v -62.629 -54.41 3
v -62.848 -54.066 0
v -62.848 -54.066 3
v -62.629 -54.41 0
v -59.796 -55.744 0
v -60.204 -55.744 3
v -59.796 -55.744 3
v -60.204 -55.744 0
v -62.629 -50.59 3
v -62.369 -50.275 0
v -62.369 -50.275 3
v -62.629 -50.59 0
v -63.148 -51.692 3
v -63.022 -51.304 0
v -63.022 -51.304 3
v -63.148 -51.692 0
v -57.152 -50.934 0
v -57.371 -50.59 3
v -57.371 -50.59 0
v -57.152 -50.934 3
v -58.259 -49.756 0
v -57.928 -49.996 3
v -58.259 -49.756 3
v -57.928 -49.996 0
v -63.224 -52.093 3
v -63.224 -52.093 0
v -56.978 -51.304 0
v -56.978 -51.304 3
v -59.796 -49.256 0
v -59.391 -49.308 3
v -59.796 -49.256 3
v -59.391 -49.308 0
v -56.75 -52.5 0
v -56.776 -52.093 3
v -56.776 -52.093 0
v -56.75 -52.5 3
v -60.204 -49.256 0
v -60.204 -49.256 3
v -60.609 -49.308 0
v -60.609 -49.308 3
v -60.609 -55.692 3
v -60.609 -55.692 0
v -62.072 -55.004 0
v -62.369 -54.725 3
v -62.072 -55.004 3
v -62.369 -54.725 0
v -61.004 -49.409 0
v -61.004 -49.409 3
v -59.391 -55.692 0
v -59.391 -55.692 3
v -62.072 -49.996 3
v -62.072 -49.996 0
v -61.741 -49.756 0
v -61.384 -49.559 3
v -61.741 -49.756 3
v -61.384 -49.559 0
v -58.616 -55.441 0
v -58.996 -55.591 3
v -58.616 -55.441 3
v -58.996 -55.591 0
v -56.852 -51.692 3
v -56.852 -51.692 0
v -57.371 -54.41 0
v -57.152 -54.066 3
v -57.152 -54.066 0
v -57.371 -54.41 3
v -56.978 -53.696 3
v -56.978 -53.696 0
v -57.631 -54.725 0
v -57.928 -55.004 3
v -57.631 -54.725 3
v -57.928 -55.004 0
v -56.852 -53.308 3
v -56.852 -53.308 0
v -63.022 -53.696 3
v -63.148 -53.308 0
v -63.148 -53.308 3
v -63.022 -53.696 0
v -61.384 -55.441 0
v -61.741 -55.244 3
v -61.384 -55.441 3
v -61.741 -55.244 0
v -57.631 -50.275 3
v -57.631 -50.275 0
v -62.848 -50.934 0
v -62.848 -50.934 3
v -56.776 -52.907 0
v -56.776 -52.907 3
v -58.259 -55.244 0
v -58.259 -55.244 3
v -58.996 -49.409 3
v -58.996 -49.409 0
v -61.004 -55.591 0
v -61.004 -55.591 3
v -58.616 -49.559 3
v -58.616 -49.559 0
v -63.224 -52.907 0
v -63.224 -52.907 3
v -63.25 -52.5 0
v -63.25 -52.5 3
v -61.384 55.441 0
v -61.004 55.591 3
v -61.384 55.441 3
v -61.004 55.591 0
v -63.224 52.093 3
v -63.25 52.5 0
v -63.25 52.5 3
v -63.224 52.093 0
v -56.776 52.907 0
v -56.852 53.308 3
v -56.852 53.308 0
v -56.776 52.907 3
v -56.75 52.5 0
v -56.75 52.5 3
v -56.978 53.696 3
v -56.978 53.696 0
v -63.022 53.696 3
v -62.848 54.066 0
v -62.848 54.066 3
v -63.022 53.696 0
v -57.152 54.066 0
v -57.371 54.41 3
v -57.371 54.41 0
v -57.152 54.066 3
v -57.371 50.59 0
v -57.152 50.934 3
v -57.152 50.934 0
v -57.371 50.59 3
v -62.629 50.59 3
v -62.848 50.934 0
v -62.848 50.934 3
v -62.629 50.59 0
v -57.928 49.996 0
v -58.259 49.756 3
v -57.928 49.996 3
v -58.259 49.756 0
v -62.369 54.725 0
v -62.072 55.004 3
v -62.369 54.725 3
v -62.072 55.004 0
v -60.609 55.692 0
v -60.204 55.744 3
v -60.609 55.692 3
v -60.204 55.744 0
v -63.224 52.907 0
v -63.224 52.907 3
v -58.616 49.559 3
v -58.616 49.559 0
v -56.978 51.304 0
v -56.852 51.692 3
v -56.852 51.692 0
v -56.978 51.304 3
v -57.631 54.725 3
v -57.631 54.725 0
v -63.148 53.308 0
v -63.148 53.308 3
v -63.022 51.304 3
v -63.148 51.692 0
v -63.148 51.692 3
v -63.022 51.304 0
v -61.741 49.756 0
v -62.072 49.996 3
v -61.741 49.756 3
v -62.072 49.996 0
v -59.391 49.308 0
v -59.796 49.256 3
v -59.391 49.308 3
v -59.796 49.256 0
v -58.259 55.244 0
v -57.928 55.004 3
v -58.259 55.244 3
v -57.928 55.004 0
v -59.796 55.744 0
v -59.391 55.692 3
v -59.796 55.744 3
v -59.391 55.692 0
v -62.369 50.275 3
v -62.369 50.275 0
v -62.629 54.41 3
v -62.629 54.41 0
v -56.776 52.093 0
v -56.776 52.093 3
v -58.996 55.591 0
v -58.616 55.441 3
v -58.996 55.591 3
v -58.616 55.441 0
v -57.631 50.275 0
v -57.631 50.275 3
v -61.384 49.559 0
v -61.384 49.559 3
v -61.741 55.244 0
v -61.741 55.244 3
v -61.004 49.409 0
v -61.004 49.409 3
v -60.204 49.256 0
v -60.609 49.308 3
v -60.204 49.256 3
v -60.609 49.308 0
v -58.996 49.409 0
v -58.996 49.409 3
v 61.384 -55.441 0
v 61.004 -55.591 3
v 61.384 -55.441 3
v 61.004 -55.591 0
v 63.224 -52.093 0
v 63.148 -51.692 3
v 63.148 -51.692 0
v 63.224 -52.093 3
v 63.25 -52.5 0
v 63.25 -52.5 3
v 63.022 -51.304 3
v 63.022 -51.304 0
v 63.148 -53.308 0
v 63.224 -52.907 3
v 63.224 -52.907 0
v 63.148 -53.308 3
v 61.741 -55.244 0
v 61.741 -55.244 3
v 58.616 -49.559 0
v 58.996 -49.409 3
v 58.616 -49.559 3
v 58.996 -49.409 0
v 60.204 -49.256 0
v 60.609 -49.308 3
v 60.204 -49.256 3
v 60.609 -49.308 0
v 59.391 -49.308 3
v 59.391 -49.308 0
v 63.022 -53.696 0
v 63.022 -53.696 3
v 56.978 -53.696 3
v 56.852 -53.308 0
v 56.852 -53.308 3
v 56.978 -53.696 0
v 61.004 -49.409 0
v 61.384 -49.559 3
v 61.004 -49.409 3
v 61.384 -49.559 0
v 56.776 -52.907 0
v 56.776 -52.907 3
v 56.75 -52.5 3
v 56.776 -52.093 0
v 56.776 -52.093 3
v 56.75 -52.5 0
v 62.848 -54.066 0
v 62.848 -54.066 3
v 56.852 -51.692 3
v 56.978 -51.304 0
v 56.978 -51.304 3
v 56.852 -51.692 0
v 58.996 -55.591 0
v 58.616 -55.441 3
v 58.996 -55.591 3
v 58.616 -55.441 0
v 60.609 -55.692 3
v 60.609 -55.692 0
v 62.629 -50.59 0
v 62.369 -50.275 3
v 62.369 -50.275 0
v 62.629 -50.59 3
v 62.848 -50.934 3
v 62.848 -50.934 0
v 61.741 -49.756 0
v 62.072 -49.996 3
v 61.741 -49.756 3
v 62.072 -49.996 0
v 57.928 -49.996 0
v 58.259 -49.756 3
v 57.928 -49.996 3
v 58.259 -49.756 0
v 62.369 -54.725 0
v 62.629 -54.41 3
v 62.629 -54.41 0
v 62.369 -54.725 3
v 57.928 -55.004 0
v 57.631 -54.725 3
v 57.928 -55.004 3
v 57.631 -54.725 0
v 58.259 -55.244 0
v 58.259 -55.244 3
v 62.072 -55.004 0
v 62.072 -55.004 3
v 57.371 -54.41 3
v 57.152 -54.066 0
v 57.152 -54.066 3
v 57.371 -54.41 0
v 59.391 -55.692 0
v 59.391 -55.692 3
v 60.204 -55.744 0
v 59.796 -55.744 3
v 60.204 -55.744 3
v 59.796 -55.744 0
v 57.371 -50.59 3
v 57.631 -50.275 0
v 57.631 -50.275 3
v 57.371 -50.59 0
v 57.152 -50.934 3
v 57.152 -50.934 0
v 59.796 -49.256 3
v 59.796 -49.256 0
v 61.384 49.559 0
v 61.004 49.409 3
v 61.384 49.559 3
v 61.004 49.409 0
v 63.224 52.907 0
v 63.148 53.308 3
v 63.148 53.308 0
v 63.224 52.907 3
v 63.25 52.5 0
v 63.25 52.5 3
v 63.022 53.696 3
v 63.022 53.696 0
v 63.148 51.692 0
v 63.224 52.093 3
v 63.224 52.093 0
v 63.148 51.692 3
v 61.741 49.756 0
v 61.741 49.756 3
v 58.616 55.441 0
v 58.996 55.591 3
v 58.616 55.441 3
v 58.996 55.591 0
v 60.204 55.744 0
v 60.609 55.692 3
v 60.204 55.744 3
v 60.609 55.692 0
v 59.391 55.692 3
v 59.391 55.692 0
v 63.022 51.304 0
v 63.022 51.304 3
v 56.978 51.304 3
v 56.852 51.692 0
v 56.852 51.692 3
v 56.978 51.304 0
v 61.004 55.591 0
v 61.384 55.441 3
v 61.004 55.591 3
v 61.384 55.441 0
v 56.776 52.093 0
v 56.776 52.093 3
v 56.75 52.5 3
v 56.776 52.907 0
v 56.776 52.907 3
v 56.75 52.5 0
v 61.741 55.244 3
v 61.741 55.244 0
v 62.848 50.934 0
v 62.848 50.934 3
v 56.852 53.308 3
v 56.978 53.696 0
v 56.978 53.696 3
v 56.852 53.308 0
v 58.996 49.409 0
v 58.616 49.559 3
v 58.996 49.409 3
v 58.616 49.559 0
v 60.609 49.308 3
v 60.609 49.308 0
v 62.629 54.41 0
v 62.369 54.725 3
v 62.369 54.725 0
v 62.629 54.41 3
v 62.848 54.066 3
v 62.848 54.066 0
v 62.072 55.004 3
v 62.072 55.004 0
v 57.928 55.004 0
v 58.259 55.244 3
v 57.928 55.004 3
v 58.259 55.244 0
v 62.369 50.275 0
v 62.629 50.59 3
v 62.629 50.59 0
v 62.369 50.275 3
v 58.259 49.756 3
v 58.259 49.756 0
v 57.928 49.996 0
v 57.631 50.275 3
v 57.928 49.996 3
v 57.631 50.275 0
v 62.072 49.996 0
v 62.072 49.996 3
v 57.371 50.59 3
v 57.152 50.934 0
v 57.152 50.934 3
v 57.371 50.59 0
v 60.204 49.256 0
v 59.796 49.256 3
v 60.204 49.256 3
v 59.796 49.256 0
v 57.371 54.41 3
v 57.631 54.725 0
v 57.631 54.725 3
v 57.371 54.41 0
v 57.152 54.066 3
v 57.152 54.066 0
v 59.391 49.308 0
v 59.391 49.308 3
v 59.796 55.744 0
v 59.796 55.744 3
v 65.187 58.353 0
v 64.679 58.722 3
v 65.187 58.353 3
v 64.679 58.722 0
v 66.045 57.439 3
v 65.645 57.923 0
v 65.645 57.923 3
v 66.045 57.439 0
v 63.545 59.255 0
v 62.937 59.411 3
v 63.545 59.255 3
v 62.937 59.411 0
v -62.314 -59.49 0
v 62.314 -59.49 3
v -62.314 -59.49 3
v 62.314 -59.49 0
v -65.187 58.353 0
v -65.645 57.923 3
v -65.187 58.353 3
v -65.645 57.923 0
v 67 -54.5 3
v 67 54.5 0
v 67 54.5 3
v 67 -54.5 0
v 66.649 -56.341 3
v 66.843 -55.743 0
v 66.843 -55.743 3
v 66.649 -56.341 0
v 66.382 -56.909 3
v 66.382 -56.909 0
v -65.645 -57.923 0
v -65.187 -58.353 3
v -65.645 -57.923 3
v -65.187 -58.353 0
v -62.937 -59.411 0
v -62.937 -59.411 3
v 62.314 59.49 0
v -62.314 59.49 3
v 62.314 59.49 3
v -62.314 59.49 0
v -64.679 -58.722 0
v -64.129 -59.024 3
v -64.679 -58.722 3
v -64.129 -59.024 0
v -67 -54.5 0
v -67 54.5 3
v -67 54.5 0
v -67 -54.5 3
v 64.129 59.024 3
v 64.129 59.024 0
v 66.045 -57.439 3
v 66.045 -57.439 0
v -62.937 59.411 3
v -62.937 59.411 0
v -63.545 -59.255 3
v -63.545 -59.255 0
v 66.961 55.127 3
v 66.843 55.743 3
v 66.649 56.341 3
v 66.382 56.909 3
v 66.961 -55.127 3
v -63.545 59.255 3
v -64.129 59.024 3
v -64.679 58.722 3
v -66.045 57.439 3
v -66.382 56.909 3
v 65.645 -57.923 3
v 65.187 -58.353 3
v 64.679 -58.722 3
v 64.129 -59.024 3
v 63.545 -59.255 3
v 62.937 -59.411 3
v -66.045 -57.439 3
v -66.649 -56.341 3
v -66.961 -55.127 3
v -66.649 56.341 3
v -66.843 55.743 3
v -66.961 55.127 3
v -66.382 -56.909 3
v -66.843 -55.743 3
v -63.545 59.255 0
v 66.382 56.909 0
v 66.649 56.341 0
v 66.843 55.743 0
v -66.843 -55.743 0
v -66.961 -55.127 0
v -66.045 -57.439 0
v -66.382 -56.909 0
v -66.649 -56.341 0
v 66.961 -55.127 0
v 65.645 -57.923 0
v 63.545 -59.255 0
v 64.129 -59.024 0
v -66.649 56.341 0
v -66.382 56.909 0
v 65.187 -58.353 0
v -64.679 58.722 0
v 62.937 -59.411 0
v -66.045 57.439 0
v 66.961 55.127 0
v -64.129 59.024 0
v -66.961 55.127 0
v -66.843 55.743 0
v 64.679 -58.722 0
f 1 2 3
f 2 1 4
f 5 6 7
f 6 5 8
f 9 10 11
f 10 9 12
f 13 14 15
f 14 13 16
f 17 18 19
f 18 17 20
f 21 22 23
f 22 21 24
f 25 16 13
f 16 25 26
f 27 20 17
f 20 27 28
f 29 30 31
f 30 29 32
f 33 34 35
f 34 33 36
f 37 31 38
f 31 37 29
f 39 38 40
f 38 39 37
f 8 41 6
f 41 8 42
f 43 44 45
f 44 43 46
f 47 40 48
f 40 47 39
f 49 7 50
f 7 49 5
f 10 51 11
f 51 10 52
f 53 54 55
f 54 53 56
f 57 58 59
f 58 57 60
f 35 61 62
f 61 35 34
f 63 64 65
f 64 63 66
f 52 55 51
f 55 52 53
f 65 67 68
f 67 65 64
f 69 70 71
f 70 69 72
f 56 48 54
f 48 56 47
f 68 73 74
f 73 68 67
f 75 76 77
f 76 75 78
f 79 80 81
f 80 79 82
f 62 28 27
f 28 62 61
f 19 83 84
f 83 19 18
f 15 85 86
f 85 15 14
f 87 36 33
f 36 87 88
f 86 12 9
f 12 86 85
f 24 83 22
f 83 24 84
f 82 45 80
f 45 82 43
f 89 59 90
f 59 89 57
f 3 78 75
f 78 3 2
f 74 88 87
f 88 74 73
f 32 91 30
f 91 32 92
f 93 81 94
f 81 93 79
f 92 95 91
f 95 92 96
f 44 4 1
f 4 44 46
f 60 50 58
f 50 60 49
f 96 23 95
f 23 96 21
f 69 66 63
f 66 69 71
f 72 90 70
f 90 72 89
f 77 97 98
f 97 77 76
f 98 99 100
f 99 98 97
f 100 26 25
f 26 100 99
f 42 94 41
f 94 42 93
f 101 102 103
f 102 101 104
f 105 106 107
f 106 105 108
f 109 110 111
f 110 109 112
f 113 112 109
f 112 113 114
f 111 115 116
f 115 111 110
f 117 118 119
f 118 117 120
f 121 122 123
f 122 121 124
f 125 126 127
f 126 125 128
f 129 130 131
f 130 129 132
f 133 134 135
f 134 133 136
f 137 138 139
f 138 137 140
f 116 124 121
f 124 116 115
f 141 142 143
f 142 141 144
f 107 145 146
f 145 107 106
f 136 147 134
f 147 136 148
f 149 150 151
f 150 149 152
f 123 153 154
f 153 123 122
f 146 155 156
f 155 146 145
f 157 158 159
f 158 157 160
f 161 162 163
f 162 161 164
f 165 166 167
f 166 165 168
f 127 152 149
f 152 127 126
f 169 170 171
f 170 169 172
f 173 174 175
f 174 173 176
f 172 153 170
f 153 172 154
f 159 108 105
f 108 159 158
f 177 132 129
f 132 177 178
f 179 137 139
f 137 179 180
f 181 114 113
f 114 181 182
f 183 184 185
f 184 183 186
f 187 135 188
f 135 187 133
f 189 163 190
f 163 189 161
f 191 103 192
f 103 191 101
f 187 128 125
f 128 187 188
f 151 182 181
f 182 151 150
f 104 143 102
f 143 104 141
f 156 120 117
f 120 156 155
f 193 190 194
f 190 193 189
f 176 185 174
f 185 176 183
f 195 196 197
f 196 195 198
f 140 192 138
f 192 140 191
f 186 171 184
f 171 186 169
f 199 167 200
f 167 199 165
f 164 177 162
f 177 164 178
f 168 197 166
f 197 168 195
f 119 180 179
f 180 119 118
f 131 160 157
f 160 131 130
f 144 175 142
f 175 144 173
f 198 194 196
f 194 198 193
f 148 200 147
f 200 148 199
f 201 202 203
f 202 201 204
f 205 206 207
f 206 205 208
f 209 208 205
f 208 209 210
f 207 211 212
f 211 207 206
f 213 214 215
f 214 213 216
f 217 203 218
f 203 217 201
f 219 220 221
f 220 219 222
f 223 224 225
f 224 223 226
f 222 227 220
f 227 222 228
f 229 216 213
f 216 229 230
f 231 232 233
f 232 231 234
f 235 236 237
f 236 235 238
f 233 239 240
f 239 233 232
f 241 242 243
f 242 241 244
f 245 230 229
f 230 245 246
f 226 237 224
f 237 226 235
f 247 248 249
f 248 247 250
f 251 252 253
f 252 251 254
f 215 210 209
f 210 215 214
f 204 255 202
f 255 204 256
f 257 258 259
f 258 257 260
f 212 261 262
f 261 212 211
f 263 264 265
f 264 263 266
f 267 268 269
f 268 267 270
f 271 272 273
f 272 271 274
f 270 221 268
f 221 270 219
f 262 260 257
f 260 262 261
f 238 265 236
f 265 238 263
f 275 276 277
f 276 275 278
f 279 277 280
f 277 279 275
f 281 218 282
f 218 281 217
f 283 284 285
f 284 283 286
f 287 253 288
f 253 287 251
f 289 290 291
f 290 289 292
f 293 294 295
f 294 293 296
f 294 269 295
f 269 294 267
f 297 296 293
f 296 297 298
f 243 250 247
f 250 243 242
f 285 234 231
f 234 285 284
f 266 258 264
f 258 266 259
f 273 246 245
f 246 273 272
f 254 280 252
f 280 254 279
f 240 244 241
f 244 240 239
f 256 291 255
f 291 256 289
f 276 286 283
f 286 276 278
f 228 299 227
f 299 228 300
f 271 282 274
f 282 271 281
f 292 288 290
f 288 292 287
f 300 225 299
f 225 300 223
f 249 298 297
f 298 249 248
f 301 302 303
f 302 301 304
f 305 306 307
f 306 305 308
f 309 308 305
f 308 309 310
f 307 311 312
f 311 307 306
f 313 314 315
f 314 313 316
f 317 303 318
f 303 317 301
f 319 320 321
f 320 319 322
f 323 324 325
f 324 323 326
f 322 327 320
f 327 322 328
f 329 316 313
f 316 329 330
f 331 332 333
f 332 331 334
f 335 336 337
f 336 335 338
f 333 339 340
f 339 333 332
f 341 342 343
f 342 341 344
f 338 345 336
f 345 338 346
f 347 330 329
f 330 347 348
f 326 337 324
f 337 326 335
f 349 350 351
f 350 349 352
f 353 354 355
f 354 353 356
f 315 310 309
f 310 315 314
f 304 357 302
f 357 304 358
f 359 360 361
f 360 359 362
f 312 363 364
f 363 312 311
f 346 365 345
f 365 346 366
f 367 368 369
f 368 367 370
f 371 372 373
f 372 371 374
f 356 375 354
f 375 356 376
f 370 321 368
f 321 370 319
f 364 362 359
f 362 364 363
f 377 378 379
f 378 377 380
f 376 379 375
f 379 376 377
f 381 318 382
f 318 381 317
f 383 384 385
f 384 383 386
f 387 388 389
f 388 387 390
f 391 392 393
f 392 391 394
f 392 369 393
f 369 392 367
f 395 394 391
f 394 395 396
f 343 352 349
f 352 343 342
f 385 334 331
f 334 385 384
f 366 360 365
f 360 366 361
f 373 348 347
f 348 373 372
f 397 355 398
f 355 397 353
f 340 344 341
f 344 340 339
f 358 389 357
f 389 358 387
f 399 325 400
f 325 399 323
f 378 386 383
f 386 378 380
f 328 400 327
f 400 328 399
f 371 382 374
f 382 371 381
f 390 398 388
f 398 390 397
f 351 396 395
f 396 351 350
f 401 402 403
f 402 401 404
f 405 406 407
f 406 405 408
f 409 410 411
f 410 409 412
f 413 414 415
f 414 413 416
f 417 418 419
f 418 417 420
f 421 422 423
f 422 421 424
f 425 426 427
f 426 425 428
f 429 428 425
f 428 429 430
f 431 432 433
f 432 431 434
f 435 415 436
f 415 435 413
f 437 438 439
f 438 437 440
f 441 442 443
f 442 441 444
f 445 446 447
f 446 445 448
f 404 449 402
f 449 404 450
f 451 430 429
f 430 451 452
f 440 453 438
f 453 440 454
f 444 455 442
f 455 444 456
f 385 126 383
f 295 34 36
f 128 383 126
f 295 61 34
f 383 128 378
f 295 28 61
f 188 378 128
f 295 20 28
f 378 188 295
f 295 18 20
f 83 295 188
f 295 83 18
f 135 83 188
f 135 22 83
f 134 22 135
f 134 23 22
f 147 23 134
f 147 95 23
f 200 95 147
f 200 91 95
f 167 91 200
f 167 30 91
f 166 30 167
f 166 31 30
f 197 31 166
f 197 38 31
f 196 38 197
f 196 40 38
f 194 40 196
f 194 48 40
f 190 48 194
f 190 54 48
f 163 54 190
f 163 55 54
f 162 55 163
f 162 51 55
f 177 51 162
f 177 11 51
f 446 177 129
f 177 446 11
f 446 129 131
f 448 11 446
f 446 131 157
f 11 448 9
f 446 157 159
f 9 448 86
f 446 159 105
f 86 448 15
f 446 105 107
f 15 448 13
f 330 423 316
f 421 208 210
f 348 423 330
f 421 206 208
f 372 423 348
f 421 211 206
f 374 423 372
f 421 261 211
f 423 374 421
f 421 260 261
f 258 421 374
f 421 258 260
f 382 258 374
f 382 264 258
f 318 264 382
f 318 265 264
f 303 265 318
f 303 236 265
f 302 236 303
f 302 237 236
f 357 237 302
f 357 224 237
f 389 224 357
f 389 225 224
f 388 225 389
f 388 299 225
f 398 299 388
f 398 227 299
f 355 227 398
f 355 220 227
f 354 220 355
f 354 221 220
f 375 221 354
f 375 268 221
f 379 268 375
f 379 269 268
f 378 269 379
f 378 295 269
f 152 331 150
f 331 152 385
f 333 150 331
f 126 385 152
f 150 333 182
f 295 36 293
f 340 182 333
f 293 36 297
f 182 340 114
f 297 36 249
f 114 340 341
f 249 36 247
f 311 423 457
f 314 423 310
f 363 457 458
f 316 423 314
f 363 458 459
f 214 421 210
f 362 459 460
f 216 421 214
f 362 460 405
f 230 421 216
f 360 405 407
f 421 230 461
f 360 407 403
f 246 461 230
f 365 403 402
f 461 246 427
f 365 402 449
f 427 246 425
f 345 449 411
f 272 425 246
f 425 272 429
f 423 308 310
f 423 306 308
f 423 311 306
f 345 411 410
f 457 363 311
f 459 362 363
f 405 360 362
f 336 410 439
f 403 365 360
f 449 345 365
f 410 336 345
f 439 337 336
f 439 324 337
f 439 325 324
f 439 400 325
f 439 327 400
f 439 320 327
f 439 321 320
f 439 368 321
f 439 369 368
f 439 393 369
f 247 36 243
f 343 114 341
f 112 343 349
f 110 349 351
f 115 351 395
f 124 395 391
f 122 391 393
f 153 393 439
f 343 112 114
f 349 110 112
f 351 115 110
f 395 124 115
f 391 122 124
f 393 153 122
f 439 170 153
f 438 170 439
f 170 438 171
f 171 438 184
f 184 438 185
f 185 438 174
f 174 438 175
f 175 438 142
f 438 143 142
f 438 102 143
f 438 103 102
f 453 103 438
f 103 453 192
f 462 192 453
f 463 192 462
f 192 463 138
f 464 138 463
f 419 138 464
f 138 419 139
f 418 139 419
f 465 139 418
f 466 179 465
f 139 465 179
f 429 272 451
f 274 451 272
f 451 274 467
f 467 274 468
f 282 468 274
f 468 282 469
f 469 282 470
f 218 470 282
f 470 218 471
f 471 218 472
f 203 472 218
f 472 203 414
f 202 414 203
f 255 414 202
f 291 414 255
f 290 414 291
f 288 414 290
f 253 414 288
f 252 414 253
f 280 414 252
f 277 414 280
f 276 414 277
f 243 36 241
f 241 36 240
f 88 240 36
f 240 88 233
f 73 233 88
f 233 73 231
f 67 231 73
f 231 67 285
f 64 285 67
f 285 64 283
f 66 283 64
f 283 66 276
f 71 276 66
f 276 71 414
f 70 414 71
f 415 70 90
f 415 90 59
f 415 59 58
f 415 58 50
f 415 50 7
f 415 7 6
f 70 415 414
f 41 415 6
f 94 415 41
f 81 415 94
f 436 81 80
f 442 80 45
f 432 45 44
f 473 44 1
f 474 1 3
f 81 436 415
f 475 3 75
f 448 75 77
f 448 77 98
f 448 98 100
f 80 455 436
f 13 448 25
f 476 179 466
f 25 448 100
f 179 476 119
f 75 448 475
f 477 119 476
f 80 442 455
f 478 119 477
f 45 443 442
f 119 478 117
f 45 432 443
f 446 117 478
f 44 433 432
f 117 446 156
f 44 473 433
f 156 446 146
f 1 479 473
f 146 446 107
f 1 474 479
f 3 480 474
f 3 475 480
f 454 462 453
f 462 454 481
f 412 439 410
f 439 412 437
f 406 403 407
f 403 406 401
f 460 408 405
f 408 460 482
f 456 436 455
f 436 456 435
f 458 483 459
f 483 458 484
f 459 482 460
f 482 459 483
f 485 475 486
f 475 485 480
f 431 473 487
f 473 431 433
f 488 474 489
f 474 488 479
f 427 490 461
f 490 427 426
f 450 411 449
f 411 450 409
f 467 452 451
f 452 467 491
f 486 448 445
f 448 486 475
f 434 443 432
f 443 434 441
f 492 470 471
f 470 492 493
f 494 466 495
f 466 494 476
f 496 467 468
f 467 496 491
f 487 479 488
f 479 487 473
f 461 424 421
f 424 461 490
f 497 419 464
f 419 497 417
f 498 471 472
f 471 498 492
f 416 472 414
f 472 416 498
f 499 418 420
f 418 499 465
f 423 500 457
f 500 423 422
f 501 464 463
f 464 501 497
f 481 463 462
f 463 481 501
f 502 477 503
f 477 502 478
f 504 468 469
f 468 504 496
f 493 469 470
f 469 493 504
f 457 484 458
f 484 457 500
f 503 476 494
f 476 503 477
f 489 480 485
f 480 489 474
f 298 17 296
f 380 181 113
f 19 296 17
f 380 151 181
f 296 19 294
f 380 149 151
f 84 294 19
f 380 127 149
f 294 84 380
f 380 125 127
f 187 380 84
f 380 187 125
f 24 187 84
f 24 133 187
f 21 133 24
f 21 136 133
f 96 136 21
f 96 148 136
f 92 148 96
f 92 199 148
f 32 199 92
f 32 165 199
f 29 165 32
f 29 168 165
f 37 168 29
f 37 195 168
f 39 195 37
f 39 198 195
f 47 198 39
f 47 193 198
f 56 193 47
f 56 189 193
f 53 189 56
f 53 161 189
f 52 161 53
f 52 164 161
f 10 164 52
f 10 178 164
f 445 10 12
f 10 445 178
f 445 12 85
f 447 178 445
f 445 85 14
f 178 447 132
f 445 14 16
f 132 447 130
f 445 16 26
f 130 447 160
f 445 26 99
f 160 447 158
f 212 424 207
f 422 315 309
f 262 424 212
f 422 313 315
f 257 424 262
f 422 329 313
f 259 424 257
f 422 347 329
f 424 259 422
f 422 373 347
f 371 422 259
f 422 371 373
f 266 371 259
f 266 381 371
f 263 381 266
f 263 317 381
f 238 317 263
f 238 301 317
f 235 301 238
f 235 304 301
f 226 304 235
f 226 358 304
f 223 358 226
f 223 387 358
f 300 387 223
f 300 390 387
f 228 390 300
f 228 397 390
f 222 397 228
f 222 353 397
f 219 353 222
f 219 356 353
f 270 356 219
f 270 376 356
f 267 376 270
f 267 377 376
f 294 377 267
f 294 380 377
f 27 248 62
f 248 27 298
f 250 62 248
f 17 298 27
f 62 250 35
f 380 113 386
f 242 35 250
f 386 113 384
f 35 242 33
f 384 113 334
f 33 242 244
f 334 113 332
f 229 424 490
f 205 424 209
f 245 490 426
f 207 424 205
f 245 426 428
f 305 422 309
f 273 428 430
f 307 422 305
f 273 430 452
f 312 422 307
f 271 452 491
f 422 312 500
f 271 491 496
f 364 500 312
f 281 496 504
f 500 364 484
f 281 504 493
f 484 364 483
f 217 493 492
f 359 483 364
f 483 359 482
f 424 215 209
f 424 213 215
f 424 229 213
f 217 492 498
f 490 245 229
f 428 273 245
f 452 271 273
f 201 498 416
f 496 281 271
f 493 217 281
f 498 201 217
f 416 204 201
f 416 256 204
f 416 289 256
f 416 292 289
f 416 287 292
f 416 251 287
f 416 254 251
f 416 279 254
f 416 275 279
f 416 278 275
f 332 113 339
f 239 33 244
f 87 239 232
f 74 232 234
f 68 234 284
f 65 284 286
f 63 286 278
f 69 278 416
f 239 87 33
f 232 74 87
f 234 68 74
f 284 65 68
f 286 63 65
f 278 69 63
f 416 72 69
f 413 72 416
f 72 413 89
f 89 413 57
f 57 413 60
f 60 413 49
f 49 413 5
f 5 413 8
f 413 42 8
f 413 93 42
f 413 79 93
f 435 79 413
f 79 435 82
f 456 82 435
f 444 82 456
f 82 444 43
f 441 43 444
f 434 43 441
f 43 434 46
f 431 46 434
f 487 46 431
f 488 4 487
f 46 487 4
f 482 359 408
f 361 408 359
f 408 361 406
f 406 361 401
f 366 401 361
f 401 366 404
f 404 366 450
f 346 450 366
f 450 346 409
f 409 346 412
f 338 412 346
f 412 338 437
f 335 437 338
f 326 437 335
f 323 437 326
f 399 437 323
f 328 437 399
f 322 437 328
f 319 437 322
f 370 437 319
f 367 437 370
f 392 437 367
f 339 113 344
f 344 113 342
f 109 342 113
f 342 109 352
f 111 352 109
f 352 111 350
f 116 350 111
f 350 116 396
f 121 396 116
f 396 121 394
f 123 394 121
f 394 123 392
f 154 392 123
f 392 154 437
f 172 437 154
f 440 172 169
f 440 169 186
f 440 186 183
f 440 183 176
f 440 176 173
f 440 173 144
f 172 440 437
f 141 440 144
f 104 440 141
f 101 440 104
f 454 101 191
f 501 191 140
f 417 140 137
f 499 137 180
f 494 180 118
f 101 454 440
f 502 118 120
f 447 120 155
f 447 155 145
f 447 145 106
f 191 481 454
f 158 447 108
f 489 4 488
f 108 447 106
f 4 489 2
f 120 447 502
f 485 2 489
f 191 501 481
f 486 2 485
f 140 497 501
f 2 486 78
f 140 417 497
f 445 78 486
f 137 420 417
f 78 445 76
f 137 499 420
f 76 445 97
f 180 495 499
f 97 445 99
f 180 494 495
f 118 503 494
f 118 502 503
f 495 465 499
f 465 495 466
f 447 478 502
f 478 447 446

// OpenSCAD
$fn = 50;


difference() {
	union() {
		hull() {
			translate(v = [-62.0000000000, 54.5000000000, 0]) {
				cylinder(h = 3, r = 5);
			}
			translate(v = [62.0000000000, 54.5000000000, 0]) {
				cylinder(h = 3, r = 5);
			}
			translate(v = [-62.0000000000, -54.5000000000, 0]) {
				cylinder(h = 3, r = 5);
			}
			translate(v = [62.0000000000, -54.5000000000, 0]) {
				cylinder(h = 3, r = 5);
			}
		}
	}
	union() {
		translate(v = [-60.0000000000, -52.5000000000, -100.0000000000]) {
			cylinder(h = 200, r = 3.2500000000);
		}
		translate(v = [-60.0000000000, 52.5000000000, -100.0000000000]) {
			cylinder(h = 200, r = 3.2500000000);
		}
		translate(v = [60.0000000000, -52.5000000000, -100.0000000000]) {
			cylinder(h = 200, r = 3.2500000000);
		}
		translate(v = [60.0000000000, 52.5000000000, -100.0000000000]) {
			cylinder(h = 200, r = 3.2500000000);
		}
	}
}
